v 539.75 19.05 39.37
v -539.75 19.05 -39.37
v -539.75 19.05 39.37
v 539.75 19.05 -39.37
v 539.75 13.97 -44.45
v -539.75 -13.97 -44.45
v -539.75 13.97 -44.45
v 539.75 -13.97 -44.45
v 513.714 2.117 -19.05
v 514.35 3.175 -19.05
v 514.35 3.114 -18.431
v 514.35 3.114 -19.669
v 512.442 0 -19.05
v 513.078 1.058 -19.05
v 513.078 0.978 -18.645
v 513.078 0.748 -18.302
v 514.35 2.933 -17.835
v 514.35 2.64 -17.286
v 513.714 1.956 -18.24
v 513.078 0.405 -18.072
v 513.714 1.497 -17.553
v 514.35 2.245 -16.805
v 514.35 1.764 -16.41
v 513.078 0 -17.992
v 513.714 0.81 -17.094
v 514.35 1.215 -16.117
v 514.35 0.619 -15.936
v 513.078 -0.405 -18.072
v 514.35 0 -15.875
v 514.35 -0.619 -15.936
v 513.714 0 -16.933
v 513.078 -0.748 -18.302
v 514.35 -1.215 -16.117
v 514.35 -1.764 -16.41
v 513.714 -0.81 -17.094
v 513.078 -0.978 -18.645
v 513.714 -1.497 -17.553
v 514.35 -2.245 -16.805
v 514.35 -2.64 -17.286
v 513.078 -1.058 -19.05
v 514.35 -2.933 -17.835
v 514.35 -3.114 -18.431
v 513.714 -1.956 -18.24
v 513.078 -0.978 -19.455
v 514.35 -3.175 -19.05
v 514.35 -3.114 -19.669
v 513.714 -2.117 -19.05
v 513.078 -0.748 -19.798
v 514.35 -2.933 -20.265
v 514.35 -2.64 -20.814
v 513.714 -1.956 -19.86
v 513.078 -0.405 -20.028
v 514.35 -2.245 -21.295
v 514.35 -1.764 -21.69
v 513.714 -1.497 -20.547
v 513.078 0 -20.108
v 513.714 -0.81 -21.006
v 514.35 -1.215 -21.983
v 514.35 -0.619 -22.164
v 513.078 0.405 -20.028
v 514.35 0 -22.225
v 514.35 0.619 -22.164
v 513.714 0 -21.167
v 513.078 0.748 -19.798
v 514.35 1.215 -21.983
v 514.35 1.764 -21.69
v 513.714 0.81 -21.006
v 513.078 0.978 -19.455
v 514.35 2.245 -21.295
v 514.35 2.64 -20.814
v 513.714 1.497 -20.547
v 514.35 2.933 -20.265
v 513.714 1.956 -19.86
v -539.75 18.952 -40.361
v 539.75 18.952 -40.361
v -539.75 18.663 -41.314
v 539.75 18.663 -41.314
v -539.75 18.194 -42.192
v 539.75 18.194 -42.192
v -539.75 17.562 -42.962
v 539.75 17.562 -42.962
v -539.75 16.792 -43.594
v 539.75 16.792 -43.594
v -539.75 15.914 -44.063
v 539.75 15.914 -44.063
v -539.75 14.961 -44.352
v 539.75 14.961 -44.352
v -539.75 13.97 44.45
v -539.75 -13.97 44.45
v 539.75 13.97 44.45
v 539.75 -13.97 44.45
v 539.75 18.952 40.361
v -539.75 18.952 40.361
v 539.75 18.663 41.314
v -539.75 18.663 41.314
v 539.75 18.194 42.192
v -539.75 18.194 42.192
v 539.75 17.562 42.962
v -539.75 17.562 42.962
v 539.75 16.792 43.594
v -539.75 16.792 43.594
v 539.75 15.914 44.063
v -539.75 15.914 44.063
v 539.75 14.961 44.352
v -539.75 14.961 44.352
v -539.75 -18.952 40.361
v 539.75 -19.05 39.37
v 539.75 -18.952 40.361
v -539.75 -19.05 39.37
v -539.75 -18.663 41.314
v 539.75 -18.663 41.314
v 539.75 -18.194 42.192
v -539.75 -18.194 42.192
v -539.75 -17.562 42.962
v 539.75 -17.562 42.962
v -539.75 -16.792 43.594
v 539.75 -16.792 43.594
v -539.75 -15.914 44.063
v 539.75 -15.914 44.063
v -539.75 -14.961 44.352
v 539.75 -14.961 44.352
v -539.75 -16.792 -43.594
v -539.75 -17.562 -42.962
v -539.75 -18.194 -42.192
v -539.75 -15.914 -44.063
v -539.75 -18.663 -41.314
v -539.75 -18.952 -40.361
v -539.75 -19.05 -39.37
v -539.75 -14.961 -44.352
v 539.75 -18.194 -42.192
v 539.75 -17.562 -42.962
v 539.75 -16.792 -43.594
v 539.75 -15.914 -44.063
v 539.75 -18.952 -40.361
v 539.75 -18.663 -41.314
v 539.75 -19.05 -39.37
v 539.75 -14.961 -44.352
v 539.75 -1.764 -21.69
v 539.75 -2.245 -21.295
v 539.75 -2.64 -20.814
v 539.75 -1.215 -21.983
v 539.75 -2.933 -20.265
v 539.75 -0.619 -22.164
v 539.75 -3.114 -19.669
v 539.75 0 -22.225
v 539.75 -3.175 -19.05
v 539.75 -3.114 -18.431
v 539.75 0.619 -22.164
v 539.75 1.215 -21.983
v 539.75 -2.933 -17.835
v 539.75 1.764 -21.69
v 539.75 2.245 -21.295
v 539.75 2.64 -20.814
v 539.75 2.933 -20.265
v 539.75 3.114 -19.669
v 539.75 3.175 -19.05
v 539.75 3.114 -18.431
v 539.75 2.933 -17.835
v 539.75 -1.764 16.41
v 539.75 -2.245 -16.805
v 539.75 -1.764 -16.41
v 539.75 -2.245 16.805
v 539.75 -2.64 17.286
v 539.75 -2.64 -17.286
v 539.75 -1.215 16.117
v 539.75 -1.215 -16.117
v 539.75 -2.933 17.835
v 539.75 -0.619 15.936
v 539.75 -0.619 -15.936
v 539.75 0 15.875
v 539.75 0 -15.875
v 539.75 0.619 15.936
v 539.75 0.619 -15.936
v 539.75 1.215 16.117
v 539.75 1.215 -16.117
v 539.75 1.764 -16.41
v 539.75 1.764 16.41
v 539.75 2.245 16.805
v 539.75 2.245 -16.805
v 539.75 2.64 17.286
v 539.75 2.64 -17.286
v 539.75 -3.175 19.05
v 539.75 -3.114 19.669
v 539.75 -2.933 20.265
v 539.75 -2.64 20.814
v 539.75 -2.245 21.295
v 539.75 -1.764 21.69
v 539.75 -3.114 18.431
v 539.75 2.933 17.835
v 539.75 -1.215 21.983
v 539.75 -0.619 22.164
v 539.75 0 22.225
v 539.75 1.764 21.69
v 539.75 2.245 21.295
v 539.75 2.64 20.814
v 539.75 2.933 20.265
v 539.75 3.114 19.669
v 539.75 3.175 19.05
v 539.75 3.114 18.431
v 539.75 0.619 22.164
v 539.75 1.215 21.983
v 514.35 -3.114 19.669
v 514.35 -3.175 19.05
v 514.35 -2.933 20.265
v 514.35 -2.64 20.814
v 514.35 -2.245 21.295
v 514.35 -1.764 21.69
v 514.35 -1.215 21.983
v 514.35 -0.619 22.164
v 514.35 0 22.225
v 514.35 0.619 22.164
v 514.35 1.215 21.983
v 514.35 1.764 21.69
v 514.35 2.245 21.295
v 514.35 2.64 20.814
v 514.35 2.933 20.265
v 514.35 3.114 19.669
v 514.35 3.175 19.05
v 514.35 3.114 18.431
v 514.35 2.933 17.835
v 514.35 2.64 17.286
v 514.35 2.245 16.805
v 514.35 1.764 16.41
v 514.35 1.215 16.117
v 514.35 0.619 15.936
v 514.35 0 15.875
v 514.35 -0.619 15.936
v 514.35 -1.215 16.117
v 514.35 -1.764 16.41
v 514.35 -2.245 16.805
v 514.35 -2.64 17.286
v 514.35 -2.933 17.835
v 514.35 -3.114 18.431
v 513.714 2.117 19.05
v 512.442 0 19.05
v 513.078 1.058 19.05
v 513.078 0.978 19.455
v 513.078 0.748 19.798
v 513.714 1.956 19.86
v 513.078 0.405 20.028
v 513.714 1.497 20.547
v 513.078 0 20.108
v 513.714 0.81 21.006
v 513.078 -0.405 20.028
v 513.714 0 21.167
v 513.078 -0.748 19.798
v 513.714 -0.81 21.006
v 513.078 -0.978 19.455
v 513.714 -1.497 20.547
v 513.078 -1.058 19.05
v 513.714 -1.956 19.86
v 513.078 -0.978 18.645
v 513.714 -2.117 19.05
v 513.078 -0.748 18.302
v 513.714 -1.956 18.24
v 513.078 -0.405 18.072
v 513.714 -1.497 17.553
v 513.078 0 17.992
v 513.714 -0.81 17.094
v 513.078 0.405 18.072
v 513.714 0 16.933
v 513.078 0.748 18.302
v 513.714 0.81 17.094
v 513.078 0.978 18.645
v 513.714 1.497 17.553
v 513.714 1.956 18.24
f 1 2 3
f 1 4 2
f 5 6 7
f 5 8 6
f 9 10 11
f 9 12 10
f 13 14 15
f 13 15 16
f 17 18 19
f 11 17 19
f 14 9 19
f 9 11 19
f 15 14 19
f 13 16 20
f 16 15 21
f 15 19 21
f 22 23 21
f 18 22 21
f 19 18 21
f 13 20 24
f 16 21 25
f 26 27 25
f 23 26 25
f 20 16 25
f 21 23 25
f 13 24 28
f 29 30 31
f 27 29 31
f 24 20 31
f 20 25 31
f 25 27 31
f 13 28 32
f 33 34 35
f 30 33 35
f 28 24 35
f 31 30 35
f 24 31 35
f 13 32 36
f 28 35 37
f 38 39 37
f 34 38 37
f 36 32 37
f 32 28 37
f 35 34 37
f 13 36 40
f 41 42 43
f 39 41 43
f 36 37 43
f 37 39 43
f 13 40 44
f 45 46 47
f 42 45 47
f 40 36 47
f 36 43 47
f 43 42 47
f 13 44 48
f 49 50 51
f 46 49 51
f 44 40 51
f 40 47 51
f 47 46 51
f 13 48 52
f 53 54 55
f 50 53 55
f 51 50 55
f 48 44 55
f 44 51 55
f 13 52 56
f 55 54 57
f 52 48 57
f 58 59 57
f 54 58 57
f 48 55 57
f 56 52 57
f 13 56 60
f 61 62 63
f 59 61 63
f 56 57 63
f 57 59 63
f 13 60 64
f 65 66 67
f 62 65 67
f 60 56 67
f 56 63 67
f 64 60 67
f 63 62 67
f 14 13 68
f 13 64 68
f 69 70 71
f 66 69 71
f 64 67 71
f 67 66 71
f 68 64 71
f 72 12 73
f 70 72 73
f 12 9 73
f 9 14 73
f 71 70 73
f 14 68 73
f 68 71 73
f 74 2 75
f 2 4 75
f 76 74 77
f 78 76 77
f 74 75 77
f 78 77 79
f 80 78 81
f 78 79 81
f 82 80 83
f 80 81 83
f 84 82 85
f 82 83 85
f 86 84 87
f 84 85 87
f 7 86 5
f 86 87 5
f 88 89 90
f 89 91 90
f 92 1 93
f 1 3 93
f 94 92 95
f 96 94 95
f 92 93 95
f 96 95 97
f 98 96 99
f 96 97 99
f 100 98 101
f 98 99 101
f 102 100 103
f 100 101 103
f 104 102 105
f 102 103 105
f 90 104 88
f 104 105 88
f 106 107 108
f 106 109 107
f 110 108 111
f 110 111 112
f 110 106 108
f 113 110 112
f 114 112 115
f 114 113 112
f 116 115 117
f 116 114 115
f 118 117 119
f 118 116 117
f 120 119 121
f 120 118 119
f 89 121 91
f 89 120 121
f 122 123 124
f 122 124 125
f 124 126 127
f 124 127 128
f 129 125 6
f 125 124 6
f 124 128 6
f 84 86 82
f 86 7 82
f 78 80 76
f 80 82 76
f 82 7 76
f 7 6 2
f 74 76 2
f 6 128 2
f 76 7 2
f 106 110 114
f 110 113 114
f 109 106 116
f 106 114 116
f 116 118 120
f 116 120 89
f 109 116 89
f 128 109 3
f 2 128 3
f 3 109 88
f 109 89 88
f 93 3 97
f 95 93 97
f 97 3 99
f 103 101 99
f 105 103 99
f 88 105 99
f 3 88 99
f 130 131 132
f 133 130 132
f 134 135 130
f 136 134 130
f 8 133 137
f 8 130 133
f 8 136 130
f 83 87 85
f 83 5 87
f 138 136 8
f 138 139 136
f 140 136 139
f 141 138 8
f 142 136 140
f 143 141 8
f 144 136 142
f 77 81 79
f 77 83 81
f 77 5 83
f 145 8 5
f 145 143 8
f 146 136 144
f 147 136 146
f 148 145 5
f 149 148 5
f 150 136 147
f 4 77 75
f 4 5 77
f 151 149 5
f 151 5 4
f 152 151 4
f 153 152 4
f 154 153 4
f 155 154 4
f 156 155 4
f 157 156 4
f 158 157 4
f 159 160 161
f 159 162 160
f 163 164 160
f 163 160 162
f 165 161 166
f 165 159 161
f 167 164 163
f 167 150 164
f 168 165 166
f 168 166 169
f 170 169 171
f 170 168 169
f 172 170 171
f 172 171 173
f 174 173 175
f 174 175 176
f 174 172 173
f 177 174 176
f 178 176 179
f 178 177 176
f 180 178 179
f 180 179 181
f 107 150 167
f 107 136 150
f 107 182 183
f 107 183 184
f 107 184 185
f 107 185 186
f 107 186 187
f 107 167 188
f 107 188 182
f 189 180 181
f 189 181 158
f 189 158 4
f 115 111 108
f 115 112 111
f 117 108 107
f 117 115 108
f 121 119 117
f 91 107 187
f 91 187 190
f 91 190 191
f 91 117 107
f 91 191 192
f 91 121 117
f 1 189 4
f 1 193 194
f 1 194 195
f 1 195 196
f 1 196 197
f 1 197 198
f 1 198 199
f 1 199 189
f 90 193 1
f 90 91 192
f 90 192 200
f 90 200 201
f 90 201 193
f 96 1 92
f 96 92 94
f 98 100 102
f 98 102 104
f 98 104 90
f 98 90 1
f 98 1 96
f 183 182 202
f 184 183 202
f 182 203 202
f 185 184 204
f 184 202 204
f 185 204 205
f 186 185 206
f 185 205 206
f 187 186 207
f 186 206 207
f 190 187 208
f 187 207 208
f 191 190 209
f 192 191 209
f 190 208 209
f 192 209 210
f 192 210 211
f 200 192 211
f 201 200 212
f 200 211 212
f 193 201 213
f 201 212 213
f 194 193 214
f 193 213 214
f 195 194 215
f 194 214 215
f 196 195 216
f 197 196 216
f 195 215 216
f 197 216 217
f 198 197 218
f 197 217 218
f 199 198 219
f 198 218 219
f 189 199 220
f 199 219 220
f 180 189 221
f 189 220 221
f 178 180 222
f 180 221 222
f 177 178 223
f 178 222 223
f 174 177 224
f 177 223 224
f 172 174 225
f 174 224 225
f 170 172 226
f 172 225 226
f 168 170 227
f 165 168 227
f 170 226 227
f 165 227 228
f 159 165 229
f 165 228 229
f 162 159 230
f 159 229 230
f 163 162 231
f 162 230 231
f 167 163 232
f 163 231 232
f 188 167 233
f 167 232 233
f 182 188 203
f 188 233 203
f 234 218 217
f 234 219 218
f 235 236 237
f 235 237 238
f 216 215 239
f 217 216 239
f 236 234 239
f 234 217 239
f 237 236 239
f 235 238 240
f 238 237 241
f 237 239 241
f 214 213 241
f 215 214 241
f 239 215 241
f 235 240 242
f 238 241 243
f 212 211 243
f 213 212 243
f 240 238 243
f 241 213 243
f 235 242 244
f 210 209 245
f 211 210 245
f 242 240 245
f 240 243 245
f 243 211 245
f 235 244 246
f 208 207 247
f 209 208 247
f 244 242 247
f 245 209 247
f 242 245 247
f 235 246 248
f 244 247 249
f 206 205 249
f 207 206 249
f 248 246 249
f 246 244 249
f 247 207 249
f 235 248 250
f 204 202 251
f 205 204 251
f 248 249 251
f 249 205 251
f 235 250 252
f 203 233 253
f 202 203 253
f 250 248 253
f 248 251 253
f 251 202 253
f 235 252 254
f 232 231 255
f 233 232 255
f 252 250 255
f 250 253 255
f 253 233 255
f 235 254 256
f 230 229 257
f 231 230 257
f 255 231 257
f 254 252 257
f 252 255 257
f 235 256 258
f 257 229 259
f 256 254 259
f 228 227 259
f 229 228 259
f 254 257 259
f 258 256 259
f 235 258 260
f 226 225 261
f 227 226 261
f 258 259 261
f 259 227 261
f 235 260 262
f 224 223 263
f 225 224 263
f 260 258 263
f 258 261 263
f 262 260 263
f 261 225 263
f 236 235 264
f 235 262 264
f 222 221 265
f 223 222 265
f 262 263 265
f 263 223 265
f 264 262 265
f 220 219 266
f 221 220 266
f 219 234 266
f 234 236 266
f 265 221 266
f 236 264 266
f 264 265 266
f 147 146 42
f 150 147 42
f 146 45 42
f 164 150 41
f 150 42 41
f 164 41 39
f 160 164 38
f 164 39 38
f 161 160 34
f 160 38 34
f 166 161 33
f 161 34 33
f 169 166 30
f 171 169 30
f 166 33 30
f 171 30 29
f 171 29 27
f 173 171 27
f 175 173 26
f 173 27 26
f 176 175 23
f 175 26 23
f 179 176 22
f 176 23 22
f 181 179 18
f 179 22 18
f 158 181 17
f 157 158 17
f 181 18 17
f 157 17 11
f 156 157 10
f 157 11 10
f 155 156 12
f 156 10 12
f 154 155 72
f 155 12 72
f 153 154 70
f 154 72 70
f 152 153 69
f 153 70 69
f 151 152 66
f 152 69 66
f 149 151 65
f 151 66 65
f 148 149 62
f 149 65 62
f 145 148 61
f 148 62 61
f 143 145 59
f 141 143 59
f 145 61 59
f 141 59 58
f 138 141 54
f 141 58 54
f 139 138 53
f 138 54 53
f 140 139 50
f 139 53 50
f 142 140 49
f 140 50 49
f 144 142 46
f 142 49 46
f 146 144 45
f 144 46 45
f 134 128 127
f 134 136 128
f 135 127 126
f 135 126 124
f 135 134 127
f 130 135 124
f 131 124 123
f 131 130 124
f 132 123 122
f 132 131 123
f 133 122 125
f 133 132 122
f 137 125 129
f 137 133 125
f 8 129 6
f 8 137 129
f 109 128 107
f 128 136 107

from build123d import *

# Parameters (mm, degrees)
F0_W     = 38.1
F0_H     = 88.9
F1_DEPTH = 539.75
F2_R     = 5.08
F4_D     = 6.35
F4_DEPTH = 25.4
F4_TIP   = 1.9077324654


with BuildPart() as f1:
    # F0 (on Right) → F1 (new body, symmetric)
    with BuildSketch(Plane.YZ):
        Rectangle(F0_W, F0_H)
    extrude(amount=F1_DEPTH, both=True)

    # F2
    f2_edges = [f1.edges().sort_by_distance(p)[0] for p in [
        (0, -19.05, 44.45),
        (0, 19.05, 44.45),
        (0, -19.05, -44.45),
        (0, 19.05, -44.45),
    ]]
    fillet(f2_edges, radius=F2_R)

    # F4
    with Locations(Plane.YZ.offset(539.75)):
        with Locations((0, 19.05), (0, -19.05)):
            Hole(F4_D / 2, depth=F4_DEPTH)
            with Locations((0, 0, -(F4_DEPTH + F4_TIP / 2))):  # 118° drill point
                Cone(0, F4_D / 2, F4_TIP, mode=Mode.SUBTRACT)


solid = f1.part
